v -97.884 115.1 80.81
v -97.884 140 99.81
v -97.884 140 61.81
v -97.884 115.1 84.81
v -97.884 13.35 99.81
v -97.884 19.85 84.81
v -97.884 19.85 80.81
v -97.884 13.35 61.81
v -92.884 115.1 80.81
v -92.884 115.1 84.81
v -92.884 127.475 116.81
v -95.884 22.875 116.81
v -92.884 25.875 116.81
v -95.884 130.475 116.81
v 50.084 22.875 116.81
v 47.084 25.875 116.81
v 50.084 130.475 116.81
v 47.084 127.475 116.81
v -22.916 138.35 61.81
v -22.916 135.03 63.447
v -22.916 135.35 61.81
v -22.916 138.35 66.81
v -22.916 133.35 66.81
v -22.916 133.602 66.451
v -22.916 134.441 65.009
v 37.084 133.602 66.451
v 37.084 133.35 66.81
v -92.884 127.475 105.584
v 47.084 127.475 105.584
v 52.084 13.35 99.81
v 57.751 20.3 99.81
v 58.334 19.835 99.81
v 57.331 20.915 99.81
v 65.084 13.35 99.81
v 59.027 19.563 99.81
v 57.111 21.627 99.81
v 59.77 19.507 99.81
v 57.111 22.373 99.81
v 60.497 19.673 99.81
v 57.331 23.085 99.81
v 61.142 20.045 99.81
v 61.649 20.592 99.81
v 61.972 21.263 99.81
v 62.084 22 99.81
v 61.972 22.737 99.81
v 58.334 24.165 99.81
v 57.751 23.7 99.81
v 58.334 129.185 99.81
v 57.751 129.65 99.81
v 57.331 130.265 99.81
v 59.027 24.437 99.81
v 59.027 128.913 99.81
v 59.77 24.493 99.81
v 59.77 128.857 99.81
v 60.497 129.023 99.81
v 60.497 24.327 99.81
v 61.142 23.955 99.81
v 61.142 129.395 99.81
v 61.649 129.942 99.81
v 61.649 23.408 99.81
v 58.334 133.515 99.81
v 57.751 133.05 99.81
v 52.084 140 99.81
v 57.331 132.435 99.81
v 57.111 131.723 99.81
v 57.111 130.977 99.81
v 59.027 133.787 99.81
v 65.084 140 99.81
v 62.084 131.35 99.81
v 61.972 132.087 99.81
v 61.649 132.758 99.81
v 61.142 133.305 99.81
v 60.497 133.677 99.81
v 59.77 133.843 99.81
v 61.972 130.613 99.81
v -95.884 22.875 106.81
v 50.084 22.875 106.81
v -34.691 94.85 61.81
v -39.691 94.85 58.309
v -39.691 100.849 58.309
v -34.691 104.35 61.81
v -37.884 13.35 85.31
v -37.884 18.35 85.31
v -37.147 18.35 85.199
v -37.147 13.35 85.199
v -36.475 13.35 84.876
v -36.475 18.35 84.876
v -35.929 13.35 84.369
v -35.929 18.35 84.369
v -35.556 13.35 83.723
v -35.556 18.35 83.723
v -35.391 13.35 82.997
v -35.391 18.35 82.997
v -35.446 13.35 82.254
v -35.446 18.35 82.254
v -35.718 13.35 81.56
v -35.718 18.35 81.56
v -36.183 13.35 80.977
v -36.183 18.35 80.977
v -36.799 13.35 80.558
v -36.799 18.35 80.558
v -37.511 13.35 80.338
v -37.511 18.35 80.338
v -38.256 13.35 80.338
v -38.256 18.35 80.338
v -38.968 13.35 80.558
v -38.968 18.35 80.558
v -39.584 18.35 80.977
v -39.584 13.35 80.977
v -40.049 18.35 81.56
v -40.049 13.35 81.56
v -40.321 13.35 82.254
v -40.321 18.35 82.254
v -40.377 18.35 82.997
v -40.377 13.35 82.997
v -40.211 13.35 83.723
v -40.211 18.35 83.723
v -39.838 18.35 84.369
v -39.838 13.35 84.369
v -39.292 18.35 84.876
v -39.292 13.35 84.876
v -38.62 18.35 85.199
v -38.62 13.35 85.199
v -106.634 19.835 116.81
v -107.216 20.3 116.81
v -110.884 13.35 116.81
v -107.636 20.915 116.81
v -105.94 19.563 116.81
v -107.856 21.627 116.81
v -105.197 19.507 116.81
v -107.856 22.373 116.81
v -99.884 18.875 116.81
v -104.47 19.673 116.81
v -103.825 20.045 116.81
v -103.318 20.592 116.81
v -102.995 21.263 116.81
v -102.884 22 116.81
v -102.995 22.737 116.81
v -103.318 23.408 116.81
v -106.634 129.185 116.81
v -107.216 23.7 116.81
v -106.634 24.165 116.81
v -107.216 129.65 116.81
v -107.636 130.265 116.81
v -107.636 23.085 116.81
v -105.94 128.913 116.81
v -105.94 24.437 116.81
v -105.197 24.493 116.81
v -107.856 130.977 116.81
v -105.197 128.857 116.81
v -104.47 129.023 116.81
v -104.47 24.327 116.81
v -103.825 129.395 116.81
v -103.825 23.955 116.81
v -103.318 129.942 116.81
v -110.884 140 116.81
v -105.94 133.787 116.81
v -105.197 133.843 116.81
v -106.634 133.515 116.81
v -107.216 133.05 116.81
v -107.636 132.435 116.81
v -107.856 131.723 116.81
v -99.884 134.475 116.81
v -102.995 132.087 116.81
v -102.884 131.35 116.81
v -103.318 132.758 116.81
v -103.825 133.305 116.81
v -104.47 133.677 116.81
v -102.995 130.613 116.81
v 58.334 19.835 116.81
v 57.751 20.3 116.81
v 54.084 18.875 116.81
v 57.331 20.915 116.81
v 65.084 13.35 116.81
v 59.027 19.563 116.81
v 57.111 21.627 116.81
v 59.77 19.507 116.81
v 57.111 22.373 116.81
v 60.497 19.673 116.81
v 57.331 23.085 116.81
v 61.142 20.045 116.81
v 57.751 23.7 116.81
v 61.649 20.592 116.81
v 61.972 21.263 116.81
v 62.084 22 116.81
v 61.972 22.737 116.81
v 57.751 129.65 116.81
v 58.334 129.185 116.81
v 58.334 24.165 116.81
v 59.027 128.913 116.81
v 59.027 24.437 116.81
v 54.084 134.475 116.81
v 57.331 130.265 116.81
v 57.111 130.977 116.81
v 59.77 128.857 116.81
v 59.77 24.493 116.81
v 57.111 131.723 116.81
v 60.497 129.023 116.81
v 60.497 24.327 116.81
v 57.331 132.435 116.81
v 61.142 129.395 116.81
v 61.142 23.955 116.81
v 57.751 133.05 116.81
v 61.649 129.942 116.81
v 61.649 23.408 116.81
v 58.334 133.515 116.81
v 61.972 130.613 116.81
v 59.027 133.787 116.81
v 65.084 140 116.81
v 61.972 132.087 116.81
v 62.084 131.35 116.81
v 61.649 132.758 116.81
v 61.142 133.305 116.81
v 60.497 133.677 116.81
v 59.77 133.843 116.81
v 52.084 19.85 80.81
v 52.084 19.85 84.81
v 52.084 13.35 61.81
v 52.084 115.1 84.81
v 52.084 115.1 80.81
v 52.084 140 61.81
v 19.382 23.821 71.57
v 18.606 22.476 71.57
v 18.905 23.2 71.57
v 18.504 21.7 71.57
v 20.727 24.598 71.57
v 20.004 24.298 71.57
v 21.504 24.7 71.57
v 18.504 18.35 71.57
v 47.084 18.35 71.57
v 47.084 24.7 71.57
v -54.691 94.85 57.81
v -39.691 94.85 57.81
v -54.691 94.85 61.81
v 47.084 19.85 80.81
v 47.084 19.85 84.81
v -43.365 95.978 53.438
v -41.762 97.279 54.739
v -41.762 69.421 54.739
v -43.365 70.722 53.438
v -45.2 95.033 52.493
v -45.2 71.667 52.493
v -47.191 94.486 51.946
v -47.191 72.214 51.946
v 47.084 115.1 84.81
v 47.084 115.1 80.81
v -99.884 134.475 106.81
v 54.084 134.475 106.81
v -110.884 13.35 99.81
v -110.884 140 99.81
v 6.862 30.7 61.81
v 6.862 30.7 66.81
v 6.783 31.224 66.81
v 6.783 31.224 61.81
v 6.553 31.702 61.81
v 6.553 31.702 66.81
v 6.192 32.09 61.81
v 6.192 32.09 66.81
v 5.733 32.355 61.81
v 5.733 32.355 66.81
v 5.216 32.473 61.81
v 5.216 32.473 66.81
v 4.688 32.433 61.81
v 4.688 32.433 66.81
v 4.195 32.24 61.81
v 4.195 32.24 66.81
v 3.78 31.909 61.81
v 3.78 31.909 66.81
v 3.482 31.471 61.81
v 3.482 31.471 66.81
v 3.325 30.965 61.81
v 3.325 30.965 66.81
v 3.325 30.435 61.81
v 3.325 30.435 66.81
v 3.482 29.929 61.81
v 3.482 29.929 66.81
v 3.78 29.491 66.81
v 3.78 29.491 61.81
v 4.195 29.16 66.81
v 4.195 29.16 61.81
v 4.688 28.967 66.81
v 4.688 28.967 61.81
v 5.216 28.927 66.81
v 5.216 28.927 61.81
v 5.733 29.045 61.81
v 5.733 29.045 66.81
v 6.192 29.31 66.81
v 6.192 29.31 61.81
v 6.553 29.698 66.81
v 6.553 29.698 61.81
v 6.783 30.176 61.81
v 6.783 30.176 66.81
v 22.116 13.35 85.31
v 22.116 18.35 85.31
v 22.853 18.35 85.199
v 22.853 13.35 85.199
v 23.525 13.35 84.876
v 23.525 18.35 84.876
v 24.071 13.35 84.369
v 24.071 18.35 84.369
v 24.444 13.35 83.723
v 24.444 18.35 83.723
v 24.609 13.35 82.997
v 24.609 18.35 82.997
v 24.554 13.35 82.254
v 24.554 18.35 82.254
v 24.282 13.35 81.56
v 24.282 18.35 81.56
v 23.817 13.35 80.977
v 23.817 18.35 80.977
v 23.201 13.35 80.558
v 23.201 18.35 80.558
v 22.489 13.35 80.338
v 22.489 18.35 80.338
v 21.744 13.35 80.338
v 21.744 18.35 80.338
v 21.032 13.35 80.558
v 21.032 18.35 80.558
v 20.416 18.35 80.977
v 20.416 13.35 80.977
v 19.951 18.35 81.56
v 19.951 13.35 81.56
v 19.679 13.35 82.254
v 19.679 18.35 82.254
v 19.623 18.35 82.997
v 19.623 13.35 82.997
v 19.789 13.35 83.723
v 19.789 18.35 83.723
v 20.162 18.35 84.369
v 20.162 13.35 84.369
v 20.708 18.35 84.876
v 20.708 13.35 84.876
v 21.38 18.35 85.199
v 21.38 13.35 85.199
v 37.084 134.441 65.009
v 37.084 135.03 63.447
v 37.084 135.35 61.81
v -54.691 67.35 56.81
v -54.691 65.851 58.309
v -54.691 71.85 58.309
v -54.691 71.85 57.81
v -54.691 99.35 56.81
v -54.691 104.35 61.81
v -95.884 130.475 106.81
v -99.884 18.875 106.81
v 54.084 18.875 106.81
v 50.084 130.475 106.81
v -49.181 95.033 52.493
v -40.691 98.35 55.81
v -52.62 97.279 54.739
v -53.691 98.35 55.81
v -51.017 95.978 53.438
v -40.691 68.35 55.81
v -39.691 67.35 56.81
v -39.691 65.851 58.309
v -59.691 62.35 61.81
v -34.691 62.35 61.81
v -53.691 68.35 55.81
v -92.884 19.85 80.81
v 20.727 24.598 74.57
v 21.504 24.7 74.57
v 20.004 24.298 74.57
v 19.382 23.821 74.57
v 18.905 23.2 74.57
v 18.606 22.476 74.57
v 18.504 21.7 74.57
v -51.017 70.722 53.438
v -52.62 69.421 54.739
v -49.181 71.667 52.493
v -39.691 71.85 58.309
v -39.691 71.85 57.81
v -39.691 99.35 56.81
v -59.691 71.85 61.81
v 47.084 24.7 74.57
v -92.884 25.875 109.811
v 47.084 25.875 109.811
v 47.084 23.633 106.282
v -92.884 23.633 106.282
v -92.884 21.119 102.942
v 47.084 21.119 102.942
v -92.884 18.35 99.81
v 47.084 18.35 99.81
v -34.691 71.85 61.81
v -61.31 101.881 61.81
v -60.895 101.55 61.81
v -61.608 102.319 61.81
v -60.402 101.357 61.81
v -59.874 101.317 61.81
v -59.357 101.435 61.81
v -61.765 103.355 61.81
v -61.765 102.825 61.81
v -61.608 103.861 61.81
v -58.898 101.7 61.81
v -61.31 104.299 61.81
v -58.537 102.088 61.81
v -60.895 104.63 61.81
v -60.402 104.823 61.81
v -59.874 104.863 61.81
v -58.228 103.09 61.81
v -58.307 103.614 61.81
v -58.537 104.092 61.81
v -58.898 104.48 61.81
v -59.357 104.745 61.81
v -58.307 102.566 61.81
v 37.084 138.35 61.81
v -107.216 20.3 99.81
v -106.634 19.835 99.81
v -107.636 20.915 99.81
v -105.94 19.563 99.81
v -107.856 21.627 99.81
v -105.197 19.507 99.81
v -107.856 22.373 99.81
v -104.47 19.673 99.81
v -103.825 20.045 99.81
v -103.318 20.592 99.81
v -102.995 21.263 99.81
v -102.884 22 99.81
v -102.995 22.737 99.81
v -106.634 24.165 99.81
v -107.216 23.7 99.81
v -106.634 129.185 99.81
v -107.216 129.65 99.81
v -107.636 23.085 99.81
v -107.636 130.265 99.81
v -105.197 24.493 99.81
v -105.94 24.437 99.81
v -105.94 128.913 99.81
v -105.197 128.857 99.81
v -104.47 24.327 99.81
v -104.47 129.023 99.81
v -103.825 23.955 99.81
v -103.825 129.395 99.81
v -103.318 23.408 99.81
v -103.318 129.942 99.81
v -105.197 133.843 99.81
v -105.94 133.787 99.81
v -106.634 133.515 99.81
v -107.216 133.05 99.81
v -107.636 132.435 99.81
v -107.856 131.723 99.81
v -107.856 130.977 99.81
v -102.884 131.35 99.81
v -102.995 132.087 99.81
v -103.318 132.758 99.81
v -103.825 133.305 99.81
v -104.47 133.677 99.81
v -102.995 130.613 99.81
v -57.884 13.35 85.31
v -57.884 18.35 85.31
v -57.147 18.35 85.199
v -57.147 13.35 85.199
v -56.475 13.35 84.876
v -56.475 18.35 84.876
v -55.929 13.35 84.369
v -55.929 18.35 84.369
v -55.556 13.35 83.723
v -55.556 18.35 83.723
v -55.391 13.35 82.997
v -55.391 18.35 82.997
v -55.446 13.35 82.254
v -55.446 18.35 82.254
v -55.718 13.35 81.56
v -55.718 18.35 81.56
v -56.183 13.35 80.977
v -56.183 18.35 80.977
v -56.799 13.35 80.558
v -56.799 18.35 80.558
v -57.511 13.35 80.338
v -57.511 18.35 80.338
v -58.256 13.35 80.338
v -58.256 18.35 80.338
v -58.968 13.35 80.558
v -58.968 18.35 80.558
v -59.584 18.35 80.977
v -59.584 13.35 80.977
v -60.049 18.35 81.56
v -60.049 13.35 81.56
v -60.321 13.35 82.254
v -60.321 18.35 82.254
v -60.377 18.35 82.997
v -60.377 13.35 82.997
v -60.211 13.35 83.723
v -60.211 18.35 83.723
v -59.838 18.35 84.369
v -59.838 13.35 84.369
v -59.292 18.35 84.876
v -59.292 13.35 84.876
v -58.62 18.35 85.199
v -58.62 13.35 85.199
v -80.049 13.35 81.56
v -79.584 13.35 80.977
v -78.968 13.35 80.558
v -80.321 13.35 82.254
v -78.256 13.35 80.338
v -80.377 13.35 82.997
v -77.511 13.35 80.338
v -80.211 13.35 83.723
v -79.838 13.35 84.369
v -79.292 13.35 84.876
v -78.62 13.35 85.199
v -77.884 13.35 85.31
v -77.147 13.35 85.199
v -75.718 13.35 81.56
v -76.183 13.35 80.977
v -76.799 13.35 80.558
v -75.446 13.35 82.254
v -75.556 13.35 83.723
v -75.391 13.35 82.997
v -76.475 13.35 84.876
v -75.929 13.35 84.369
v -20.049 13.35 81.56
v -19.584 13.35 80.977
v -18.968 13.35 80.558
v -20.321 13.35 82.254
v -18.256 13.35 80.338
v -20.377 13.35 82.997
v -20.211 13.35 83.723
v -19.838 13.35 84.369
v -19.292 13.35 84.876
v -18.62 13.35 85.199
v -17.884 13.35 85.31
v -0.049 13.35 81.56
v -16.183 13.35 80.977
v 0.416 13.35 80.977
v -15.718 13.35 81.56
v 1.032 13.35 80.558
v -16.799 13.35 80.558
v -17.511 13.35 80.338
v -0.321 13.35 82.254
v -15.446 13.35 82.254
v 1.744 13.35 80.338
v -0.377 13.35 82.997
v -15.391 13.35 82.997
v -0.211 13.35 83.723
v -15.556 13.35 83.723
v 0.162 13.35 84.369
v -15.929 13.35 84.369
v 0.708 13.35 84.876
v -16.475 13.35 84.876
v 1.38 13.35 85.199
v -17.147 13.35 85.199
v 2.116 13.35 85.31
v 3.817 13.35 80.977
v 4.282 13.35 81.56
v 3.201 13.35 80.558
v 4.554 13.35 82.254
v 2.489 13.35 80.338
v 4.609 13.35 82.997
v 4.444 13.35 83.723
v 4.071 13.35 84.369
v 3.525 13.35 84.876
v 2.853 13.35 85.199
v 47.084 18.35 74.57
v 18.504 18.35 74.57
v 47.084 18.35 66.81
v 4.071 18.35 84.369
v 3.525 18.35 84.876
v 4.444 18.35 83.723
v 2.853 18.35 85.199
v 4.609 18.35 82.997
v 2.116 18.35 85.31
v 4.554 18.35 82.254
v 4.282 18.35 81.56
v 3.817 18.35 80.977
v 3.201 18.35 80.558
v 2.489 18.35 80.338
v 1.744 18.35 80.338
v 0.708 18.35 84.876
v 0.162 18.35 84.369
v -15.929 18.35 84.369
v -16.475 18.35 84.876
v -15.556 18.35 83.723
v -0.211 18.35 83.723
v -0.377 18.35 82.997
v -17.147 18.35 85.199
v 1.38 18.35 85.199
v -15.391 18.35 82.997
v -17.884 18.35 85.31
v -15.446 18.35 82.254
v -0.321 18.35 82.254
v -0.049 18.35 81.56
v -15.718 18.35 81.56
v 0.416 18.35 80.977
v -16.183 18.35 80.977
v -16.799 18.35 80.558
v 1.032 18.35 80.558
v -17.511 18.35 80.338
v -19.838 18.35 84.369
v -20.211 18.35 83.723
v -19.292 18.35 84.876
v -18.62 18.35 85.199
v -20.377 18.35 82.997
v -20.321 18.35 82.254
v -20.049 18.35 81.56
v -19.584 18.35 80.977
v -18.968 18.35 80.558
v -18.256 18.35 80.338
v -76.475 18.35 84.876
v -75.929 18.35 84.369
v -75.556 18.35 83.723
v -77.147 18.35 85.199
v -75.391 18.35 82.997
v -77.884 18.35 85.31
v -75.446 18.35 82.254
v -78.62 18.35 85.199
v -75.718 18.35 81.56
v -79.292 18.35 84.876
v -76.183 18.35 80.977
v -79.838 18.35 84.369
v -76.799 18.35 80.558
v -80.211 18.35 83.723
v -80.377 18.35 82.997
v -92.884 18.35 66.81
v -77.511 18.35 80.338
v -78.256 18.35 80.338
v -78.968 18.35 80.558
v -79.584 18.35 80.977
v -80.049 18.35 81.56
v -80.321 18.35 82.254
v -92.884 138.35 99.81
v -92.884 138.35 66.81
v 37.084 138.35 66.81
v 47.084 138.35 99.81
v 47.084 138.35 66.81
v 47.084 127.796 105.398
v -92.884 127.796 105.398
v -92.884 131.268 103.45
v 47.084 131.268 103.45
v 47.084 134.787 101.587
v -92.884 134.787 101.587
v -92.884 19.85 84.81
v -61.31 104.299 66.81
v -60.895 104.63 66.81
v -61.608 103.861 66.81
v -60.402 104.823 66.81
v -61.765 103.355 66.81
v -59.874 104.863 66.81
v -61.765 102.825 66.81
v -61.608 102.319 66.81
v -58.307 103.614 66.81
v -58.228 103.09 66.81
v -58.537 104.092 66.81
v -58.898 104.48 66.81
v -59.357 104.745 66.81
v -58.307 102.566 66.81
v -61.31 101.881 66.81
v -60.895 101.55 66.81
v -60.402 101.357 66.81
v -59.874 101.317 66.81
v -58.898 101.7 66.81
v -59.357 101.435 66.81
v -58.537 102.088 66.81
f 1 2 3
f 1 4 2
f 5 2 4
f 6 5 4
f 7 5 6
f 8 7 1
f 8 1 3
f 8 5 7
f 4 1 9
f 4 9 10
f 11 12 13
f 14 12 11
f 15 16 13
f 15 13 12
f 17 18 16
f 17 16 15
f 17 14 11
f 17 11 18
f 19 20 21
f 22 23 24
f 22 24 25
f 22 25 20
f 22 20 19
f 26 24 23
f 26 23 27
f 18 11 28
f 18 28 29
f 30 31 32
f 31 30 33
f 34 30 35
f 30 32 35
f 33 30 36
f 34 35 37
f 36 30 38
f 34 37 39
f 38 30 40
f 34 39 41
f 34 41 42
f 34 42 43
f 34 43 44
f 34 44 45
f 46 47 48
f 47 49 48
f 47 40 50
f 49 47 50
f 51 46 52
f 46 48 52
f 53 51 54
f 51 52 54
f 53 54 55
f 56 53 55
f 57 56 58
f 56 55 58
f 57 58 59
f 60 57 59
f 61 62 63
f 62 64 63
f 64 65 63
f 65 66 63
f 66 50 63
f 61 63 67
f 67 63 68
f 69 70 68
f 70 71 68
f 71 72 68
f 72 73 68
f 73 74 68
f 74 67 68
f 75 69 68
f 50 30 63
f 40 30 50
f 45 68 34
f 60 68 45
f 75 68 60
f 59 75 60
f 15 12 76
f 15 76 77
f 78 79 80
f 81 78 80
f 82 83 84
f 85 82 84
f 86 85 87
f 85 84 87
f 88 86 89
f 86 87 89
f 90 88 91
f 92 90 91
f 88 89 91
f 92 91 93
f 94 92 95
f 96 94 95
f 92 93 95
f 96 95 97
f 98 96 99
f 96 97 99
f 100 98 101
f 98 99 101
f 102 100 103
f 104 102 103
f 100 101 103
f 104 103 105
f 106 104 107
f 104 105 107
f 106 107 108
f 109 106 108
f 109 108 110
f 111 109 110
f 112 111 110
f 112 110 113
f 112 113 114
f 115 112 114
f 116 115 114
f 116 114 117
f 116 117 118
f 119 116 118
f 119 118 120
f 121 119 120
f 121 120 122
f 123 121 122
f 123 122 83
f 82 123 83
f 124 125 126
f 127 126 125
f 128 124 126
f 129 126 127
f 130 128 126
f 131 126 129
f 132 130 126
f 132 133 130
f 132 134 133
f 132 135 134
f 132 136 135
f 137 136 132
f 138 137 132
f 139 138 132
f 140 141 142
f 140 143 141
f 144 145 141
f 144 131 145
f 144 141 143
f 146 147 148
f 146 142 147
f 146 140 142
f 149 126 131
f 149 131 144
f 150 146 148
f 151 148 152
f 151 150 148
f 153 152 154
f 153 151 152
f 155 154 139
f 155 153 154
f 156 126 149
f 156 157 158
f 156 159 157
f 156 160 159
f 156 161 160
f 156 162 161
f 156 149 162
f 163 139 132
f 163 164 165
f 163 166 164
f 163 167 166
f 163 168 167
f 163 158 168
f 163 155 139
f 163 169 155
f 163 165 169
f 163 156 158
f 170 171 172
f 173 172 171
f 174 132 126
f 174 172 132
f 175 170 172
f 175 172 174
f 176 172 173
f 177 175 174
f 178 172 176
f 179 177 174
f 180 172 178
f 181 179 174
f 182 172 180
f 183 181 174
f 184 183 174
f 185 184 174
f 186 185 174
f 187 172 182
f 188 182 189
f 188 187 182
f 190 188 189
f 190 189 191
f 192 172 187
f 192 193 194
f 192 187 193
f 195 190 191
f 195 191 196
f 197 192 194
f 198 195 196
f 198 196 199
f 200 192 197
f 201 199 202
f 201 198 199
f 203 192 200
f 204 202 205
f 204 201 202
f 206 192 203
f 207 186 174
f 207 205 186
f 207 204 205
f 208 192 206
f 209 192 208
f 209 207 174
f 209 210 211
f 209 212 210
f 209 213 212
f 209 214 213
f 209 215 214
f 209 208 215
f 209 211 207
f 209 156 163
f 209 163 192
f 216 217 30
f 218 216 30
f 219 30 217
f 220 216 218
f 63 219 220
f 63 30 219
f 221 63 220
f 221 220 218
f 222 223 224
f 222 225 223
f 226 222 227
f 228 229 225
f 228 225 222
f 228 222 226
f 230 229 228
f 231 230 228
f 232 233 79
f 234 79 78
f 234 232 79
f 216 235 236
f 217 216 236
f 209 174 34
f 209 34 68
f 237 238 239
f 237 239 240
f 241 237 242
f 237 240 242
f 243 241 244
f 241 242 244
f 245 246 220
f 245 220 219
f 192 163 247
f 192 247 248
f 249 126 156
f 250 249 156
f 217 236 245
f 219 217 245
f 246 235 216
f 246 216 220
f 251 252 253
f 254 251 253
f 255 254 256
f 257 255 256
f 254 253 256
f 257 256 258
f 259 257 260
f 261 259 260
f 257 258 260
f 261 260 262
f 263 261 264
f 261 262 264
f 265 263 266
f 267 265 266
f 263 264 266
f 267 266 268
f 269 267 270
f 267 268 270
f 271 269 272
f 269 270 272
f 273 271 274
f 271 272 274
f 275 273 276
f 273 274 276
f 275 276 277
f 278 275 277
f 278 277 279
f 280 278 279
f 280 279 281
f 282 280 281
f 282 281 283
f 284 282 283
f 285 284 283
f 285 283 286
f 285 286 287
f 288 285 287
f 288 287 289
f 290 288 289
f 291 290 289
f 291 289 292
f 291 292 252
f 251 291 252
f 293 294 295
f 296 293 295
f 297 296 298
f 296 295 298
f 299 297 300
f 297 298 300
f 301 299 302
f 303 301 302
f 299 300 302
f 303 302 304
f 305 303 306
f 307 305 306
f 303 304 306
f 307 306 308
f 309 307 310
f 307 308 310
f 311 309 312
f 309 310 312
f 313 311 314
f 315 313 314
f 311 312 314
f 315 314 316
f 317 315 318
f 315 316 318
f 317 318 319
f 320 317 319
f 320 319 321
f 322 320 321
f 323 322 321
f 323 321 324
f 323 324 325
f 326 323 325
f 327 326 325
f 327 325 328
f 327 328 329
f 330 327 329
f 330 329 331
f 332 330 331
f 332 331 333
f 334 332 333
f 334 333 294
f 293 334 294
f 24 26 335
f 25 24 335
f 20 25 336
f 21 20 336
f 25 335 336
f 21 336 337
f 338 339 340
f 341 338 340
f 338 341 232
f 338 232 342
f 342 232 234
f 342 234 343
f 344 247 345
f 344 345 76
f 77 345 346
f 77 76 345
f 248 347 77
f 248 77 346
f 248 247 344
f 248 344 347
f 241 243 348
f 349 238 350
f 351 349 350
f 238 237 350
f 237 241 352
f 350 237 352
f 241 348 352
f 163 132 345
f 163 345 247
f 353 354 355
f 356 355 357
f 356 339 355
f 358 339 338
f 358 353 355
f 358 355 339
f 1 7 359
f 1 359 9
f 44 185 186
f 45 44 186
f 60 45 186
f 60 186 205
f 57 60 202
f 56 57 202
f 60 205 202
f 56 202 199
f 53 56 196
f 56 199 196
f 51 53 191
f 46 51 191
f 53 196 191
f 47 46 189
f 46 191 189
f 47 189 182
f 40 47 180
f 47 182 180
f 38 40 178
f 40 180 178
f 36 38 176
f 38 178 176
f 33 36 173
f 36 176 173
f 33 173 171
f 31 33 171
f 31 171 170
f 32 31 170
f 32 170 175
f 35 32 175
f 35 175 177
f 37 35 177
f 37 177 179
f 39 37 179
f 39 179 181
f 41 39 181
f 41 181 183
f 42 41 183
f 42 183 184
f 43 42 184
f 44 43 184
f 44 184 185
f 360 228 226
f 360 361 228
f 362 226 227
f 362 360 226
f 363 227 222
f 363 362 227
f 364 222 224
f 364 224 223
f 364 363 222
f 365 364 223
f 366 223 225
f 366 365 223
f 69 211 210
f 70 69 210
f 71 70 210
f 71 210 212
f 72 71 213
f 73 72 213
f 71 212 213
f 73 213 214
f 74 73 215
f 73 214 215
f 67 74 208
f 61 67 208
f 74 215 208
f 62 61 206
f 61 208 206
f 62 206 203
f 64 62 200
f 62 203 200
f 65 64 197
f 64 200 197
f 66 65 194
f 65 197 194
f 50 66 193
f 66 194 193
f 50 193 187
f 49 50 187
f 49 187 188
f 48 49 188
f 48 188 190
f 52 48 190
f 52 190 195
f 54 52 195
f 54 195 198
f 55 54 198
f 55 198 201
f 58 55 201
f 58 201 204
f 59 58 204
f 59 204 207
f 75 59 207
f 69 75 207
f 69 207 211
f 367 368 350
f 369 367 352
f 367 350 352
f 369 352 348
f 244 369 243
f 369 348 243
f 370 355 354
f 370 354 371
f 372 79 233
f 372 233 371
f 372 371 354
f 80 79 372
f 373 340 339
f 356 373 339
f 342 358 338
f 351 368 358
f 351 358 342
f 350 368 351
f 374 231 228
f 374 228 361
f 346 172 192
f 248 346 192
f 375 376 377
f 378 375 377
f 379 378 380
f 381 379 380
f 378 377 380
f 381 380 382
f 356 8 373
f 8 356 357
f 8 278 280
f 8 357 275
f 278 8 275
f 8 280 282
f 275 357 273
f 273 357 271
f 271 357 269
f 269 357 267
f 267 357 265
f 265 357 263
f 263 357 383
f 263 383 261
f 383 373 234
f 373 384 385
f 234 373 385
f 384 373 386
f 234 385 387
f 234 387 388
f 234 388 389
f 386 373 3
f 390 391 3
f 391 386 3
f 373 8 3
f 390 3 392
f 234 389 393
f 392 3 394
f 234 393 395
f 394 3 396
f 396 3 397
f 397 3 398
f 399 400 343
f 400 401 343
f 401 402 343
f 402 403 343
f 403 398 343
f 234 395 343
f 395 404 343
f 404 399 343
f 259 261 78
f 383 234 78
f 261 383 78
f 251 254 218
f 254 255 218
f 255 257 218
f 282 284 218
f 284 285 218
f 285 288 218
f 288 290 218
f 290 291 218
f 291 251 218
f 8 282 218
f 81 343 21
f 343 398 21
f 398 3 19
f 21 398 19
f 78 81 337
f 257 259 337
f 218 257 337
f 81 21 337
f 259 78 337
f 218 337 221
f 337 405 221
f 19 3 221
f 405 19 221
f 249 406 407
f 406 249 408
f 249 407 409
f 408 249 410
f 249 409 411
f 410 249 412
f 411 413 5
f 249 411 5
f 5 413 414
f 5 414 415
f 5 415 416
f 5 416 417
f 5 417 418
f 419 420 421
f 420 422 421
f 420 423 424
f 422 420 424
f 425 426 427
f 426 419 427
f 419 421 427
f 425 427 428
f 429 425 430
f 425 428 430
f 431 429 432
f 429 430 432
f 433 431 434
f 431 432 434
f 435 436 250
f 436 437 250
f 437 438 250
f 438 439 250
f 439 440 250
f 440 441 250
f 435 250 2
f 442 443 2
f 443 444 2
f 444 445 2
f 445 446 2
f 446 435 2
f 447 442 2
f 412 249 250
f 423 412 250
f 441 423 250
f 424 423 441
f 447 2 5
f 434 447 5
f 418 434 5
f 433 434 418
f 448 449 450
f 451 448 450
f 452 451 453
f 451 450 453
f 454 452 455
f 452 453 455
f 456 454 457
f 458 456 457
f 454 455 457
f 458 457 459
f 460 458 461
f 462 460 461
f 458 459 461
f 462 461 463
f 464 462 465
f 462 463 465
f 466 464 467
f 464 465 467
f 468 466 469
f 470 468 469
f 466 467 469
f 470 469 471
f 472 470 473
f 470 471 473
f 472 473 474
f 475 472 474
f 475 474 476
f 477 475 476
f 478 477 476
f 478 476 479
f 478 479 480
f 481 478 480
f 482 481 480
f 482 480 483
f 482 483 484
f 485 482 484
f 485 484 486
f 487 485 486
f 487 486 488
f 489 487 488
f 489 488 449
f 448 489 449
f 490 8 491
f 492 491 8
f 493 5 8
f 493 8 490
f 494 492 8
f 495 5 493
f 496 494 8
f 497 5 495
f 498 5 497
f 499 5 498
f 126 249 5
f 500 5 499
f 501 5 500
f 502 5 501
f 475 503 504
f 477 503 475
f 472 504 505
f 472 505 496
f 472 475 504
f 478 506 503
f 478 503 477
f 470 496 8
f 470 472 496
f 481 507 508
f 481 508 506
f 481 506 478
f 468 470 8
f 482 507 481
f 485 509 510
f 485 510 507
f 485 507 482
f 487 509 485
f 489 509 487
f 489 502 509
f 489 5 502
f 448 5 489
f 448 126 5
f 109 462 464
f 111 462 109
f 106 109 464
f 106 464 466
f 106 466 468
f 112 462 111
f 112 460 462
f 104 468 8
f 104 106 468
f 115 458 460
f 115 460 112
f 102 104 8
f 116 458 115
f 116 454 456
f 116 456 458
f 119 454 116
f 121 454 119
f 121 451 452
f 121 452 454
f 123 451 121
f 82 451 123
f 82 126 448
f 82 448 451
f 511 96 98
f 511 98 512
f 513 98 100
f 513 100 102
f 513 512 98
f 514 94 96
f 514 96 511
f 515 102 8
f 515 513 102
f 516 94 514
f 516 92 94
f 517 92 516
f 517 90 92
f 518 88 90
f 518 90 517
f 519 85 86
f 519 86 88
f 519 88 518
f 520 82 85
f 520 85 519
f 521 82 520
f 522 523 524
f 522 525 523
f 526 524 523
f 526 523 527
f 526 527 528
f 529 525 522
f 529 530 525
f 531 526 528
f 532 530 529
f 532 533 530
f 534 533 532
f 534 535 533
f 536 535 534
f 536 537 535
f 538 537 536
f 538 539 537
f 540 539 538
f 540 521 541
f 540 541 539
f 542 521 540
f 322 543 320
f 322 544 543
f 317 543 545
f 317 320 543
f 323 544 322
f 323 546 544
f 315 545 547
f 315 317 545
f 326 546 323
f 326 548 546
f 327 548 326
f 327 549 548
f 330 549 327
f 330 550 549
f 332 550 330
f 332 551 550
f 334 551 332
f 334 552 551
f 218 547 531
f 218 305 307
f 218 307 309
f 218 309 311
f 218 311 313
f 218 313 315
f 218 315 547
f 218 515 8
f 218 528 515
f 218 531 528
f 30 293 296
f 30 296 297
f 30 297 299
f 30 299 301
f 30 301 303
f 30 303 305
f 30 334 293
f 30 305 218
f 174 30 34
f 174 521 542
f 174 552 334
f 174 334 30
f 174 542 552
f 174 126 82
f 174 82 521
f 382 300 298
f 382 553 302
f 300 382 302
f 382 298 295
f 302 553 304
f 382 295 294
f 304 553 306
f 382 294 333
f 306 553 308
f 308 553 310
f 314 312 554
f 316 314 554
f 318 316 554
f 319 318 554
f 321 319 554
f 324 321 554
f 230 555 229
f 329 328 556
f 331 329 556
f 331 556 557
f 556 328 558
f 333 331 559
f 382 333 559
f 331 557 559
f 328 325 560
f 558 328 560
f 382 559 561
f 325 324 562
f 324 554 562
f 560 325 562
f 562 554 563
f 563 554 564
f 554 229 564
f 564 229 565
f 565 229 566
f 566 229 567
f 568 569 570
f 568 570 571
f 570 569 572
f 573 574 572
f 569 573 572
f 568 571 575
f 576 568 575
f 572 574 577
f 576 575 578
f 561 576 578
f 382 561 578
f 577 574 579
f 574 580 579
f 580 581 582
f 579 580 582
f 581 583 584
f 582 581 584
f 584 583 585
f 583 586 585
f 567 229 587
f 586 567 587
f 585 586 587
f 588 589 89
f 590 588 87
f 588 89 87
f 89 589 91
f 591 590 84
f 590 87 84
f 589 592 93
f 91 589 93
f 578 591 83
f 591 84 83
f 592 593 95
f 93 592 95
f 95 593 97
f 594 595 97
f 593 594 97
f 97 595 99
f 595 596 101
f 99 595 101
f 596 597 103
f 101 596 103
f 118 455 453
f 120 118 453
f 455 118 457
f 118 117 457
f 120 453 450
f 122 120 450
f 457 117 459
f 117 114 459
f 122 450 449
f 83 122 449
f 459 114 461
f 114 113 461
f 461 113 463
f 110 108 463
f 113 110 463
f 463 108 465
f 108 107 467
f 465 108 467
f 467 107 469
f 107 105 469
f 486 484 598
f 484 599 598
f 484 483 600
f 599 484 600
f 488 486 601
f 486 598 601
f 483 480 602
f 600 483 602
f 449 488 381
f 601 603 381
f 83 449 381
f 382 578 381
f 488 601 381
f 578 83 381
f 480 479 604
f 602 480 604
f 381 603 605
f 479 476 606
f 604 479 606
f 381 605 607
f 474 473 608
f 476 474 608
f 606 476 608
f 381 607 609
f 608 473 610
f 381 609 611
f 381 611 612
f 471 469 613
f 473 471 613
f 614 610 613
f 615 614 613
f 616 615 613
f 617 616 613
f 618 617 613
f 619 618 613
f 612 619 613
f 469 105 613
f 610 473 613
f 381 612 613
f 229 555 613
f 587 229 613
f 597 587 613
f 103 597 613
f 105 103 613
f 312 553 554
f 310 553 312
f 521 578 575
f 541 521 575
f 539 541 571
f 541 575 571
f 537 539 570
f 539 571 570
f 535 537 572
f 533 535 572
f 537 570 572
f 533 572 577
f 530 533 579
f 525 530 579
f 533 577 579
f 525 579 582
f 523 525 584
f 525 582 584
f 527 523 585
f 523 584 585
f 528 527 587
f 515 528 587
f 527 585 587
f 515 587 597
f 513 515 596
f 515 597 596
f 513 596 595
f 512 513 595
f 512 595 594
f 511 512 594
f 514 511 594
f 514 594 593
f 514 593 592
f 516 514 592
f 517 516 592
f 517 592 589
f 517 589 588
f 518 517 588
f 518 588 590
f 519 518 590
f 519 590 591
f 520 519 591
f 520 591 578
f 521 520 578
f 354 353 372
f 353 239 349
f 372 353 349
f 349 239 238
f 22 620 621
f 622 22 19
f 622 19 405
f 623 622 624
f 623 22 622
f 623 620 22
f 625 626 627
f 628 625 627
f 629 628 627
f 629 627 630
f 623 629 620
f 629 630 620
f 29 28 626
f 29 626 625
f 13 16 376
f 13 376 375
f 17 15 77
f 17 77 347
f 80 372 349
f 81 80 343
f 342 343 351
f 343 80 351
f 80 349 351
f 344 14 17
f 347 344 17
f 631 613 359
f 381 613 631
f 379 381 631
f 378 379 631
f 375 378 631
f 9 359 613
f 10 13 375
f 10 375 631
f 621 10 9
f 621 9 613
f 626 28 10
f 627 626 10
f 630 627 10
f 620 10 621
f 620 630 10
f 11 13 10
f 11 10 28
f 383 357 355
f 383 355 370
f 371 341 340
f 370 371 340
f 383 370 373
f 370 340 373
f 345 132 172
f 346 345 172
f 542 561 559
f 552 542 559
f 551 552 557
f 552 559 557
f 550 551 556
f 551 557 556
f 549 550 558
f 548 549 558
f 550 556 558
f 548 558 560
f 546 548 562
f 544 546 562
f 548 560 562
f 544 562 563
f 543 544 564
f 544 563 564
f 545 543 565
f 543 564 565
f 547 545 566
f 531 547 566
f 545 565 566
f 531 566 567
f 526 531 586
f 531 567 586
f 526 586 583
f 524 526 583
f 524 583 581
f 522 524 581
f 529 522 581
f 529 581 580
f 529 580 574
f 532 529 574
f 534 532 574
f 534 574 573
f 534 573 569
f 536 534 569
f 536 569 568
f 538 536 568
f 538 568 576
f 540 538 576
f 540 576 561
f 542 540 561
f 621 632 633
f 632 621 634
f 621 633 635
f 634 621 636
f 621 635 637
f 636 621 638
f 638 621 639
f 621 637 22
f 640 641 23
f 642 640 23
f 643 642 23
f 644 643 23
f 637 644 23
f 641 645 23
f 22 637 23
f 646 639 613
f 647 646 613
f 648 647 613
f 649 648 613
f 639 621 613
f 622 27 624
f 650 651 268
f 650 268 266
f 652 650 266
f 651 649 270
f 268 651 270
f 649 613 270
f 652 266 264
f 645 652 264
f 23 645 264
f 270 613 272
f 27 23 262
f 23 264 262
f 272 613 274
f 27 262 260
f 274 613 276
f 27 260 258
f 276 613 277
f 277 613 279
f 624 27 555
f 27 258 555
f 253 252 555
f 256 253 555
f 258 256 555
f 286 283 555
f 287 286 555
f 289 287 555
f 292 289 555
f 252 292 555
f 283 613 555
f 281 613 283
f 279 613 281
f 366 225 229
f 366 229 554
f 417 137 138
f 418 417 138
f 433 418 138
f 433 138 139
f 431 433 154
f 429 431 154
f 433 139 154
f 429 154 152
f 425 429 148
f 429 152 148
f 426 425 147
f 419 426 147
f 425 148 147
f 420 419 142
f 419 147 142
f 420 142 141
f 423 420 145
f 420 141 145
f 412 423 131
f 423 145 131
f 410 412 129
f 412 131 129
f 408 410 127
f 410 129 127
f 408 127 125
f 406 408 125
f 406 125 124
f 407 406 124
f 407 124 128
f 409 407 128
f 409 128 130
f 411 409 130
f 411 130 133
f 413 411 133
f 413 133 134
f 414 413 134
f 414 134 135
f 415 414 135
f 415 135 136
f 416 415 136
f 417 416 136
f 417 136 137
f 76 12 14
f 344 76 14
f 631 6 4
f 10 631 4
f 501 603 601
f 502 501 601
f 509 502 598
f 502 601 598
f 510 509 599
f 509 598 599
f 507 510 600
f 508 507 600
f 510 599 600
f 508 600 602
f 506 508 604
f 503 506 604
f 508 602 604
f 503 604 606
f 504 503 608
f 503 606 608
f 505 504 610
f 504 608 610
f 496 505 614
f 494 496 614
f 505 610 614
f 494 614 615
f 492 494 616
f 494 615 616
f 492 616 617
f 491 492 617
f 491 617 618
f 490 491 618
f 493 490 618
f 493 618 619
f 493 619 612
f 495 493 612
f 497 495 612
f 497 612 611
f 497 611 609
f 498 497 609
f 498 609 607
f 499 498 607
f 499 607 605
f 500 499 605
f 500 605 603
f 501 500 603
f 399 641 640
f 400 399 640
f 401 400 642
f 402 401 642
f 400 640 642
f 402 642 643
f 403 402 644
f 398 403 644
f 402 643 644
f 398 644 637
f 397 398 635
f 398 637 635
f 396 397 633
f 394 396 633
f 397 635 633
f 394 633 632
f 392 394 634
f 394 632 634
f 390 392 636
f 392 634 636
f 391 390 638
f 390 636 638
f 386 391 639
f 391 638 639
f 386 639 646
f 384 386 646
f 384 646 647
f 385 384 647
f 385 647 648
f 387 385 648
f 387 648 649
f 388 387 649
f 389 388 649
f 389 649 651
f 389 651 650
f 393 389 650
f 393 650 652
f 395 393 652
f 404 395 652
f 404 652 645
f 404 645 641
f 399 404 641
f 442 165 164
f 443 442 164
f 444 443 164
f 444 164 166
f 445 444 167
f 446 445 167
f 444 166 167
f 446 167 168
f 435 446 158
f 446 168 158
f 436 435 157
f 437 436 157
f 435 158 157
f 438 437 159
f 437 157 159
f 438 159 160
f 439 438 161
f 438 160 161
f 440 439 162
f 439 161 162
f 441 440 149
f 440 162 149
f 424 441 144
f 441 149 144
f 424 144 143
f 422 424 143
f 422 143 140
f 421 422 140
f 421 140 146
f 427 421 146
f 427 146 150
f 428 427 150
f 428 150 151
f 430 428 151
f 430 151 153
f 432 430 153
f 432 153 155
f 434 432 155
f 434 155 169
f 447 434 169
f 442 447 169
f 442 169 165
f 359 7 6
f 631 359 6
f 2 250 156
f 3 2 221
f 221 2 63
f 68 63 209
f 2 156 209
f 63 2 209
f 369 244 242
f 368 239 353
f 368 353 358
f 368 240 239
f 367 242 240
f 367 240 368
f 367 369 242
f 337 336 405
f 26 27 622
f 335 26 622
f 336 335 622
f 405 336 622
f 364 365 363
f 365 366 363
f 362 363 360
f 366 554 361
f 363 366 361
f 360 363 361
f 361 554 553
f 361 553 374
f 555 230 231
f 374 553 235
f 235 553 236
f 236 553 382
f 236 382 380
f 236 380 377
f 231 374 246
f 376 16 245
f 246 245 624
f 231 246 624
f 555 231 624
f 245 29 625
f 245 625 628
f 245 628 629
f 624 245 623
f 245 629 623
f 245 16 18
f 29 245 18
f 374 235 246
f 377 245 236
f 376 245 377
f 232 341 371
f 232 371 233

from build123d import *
from OCP.BRepFilletAPI import BRepFilletAPI_MakeChamfer

# Parameters (mm, degrees)
SKETCH1_R               = 172.5
BOSS_EXTRUDE1_DEPTH     = 10
SKETCH2_R               = 48.41
CUT_EXTRUDE1_DEPTH      = 10
BOSS_EXTRUDE2_DEPTH     = 5
CUT_EXTRUDE2_DEPTH      = 497
CUT_EXTRUDE6_START      = -497
CUT_EXTRUDE6_DEPTH      = 497
SKETCH6_W               = 195.767044214
SKETCH6_H               = 55
SKETCH6_W_2             = 185.767044214
SKETCH6_H_2             = 45
BOSS_EXTRUDE3_DEPTH     = 133.35
SKETCH7_W               = 185.767044214
SKETCH7_H               = 45
BOSS_EXTRUDE4_DEPTH     = 5
BOSS_EXTRUDE5_DEPTH     = 8
CHAMFER1_SIZE           = 8
CHAMFER1_SIZE2          = 6.250285012
CHAMFER1_PART_2_SIZE    = 8
CHAMFER1_PART_2_SIZE2   = 6.250285012
CHAMFER1_PART_3_SIZE    = 8
CHAMFER1_PART_3_SIZE2   = 6.250285012
FILLET1_R               = 38
SKETCH9_R               = 374.079334695
CUT_EXTRUDE7_DEPTH      = 93
CUT_EXTRUDE8_DEPTH      = 93
CUT_EXTRUDE8_DEPTH_BACK = 93
SKETCH10_R              = 229.38613092
SKETCH10_R_2            = 152.4
SKETCH11_W              = 291.443368419
SKETCH11_H              = 134.798764099
SKETCH11_W_2            = 144.967044214
SKETCH11_H_2            = 55
CUT_EXTRUDE9_DEPTH      = 143
SKETCH12_W              = 5
SKETCH12_H              = 55
BOSS_EXTRUDE6_DEPTH     = 133.35
SKETCH14_W              = 139.967044214
SKETCH14_H              = 45
BOSS_EXTRUDE7_DEPTH     = 5
SKETCH15_W              = 139.967044214
SKETCH15_H              = 123.35
CUT_EXTRUDE11_DEPTH     = 13
SKETCH16_W              = 10
SKETCH16_H              = 133.35
SKETCH16_W_2            = 149.967044214
BOSS_EXTRUDE9_DEPTH     = 17
SKETCH17_W              = 153.967044214
SKETCH17_H              = 115.6
SKETCH17_W_2            = 145.967044214
SKETCH17_H_2            = 107.6
CUT_EXTRUDE12_DEPTH     = 10
CHAMFER2_SIZE           = 10
CHAMFER2_SIZE2          = 5.773502692
SKETCH20_W              = 169.967044214
SKETCH20_H              = 3.35
CUT_EXTRUDE17_DEPTH     = 177.5
SKETCH25_W              = 139.967044214
SKETCH25_H              = 38.773502692
BOSS_EXTRUDE11_DEPTH    = 5
SKETCH26_W              = 3
SKETCH26_H              = 130
BOSS_EXTRUDE12_DEPTH    = 17
SKETCH18_R              = 2.5
CUT_EXTRUDE19_DEPTH     = 26
SKETCH27_W              = 60
SKETCH27_H              = 3
CUT_EXTRUDE20_DEPTH     = 23
SKETCH28_R              = 2.5
CUT_EXTRUDE21_DEPTH     = 10
SKETCH29_W              = 15
SKETCH29_H              = 30
BOSS_EXTRUDE13_DEPTH    = 10
SKETCH30_W              = 4
SKETCH30_H              = 23
CUT_EXTRUDE22_DEPTH     = 21
CHAMFER3_SIZE           = 6
SKETCH31_W              = 175.967044214
SKETCH31_H              = 24.006818343
CUT_EXTRUDE23_DEPTH     = 71
SKETCH33_W              = 4
SKETCH33_H              = 95.25
CUT_EXTRUDE25_DEPTH     = 182
CHAMFER5_SIZE           = 5
CHAMFER6_SIZE           = 4
FILLET2_R               = 10
SKETCH32_R              = 1.778
CUT_EXTRUDE26_DEPTH     = 10
CHAMFER7_SIZE           = 5
CHAMFER7_SIZE2          = 3.501037691
SKETCH34_W              = 3
SKETCH34_H              = 6.35
BOSS_EXTRUDE14_DEPTH    = 28.58
FILLET3_R               = 3
FILLET4_R               = 53
FILLET5_R               = 163
CHAMFER8_SIZE           = 2
CHAMFER8_SIZE2          = 2.856296013
FILLET7_R               = 10


# Some blends are built 0.0001 mm under size
with BuildPart() as part:
    # Sketch1 → Boss-Extrude1 (new body)
    with BuildSketch(Plane(origin=(0, 0, 0), x_dir=(1, 0, 0), z_dir=(0, 1, 0))):
        with Locations(Location((0, 0, 0), (0, 0, 270))):
            Circle(SKETCH1_R)
    extrude(amount=BOSS_EXTRUDE1_DEPTH)

    # Sketch2 → Cut-Extrude1 (cut)
    with BuildSketch(Plane(origin=(0, 10, 0), x_dir=(1, 0, 0), z_dir=(0, 1, 0))):
        with Locations((-75.91, -178.72)):
            Circle(SKETCH2_R)
        with Locations((75.91, -178.72)):
            Circle(SKETCH2_R)
    extrude(amount=-CUT_EXTRUDE1_DEPTH, mode=Mode.SUBTRACT)

    # Sketch3 → Boss-Extrude2 (add)
    with BuildSketch(Plane(origin=(0, 10, 0), x_dir=(1, 0, 0), z_dir=(0, 1, 0))):
        with BuildLine():
            Line((-98.968297449, -119.81), (98.968297449, -119.81))
            ThreePointArc((98.968297449, -119.81), (0, 155.4), (-98.968297449, -119.81))
        make_face()
        with BuildLine():
            ThreePointArc((97.883522107, -116.81), (0, 152.4), (-97.883522107, -116.81))
            Line((-97.883522107, -116.81), (97.883522107, -116.81))
        make_face(mode=Mode.SUBTRACT)
    extrude(amount=BOSS_EXTRUDE2_DEPTH)

    # Sketch4 → Cut-Extrude2 (cut)
    with BuildSketch(Plane(origin=(0, 10, 0), x_dir=(1, 0, 0), z_dir=(0, 1, 0))):
        Polygon((-28.261160255, -170.169200565), (28.261160255, -170.169200565), (28.261160255, -183.836149753), (-30.300470404, -183.836149753), align=None)
    extrude(amount=-CUT_EXTRUDE2_DEPTH, mode=Mode.SUBTRACT)

    # Sketch5 → Cut-Extrude6 (cut)
    with BuildSketch(Plane(origin=(0, 10, 0), x_dir=(1, 0, 0), z_dir=(0, 1, 0)).offset(CUT_EXTRUDE6_START)):
        with BuildLine():
            ThreePointArc((26.702080818, 170.420799435), (0, 172.5), (-26.702080818, 170.420799435))
            Line((-26.702080818, 170.420799435), (26.702080818, 170.420799435))
        make_face()
        with BuildLine():
            ThreePointArc((166.525, -45.007492432), (172.5, 0), (166.525, 45.007492432))
            Line((166.525, 45.007492432), (166.525, -45.007492432))
        make_face()
        with BuildLine():
            Line((-166.525, -45.007492432), (-166.525, 45.007492432))
            ThreePointArc((-166.525, 45.007492432), (-172.5, 0), (-166.525, -45.007492432))
        make_face()
    extrude(amount=CUT_EXTRUDE6_DEPTH, mode=Mode.SUBTRACT)

    # Sketch6 → Boss-Extrude3 (add)
    with BuildSketch(Plane(origin=(0, 10, 0), x_dir=(1, 0, 0), z_dir=(0, 1, 0))):
        with Locations((0, -89.31)):
            Rectangle(SKETCH6_W, SKETCH6_H)
        with Locations((0, -89.31)):
            Rectangle(SKETCH6_W_2, SKETCH6_H_2, mode=Mode.SUBTRACT)
    extrude(amount=BOSS_EXTRUDE3_DEPTH)

    # Sketch7 → Boss-Extrude4 (add)
    with BuildSketch(Plane(origin=(0, 10, 0), x_dir=(1, 0, 0), z_dir=(0, 1, 0))):
        with Locations((0, -89.31)):
            Rectangle(SKETCH7_W, SKETCH7_H)
    extrude(amount=BOSS_EXTRUDE4_DEPTH)

    # Sketch8 → Boss-Extrude5 (add)
    with BuildSketch(Plane(origin=(0, 10, 0), x_dir=(1, 0, 0), z_dir=(0, 1, 0))):
        with BuildLine():
            Line((-97.883522107, -61.81), (-112.883522107, -61.81))
            Line((-112.883522107, -61.81), (-112.883522107, -101.267136509))
            ThreePointArc((-112.883522107, -101.267136509), (-105.634768892, -108.807252061), (-97.883522107, -115.829782871))
            Line((-97.883522107, -115.829782871), (-97.883522107, -61.81))
        make_face()
        with BuildLine():
            Line((-88.028513968, -46.81), (-88.028513968, -61.81))
            Line((-88.028513968, -61.81), (97.883522107, -61.81))
            Line((97.883522107, -61.81), (97.883522107, -115.829782871))
            ThreePointArc((97.883522107, -115.829782871), (105.634768892, -108.807252061), (112.883522107, -101.267136509))
            Line((112.883522107, -101.267136509), (112.883522107, -46.81))
            Line((112.883522107, -46.81), (-88.028513968, -46.81))
        make_face()
    extrude(amount=BOSS_EXTRUDE5_DEPTH)

    # Chamfer1
    chamfer1_edges = [part.edges().sort_by_distance(p)[0] for p in [
        (-97.883522107, 18, 88.819891436),
    ]]
    chamfer1_side = [part.faces().sort_by_distance(p)[0] for p in [
        (-97.883522107, 80.599247918, 89.340686997),
    ]]
    chamfer(chamfer1_edges, length=CHAMFER1_SIZE, length2=CHAMFER1_SIZE2, reference=chamfer1_side[0])

    # Chamfer1 part 2
    chamfer1_part_2_edges = [part.edges().sort_by_distance(p)[0] for p in [
        (4.927504069, 18, 61.81),
    ]]
    chamfer1_part_2_side = [part.faces().sort_by_distance(p)[0] for p in [
        (-0.807441513, 80.139082253, 61.81),
    ]]
    chamfer(chamfer1_part_2_edges, length=CHAMFER1_PART_2_SIZE, length2=CHAMFER1_PART_2_SIZE2, reference=chamfer1_part_2_side[0])

    # Chamfer1 part 3
    chamfer1_part_3_edges = [part.edges().sort_by_distance(p)[0] for p in [
        (97.883522107, 18, 88.819891436),
    ]]
    chamfer1_part_3_side = [part.faces().sort_by_distance(p)[0] for p in [
        (97.883522107, 80.599247918, 89.340686997),
    ]]
    chamfer(chamfer1_part_3_edges, length=CHAMFER1_PART_3_SIZE, length2=CHAMFER1_PART_3_SIZE2, reference=chamfer1_part_3_side[0])

    # Fillet1
    # the kernel refuses this fillet: 38 mm, written as the material it adds along each edge
    with BuildSketch(Plane(origin=(-97.883522107, 26, 148.028657271), x_dir=(-0.61566147532566, -0.7880107536067207, 0), z_dir=(0, 0, -1))) as fillet1_piece_1_section:
        with BuildLine():
            CenterArc((13.24591235, 37.873851244), FILLET1_R, 232, 33.330100487)
            Line((-10.149223713, 7.929442607), (0, 0))
            Line((0, 0), (10.152145721, 0))
        make_face()
    fillet1_piece_1 = extrude(amount=86.218657271, mode=Mode.PRIVATE)
    fillet1_piece_1 = fillet1_piece_1 & Plane(origin=(0, 26, 0), x_dir=(-0.7443687577094257, 0, 0.6677687867414337), z_dir=(0, -1, 0)) * Cylinder(151.65, 214, mode=Mode.PRIVATE)
    add(fillet1_piece_1)
    with BuildSketch(Plane(origin=(-88.028513968, 26, 61.81), x_dir=(0, 1, 0), z_dir=(1, 0, 0))) as fillet1_piece_2_section:
        with BuildLine():
            CenterArc((12.87954976, -38), FILLET1_R, 90, 33.330100487)
            Line((-8, -6.250285012), (0, 0))
            Line((0, 0), (12.87954976, 0))
        make_face()
    fillet1_piece_2 = extrude(amount=218.110910475, mode=Mode.PRIVATE)
    fillet1_piece_2 = fillet1_piece_2 - Plane(origin=(135.883522107, 38.87954976, 61.81), x_dir=(-0.8355188154722692, -0.5494618357919104, 0), z_dir=(0, 0, -1)) * Cylinder(38, 488, mode=Mode.PRIVATE)
    add(fillet1_piece_2)
    with BuildSketch(Plane(origin=(97.883522107, 26, 29.6111256), x_dir=(0.61566147532566, -0.7880107536067207, 0), z_dir=(0, 0, 1))) as fillet1_piece_3_section:
        with BuildLine():
            CenterArc((13.24591235, 37.873851244), FILLET1_R, 232, 33.330100487)
            Line((-10.149223713, 7.929442607), (0, 0))
            Line((0, 0), (10.152145721, 0))
        make_face()
    fillet1_piece_3 = extrude(amount=118.417531672, mode=Mode.PRIVATE)
    fillet1_piece_3 = fillet1_piece_3 & Plane(origin=(0, 26, 0), x_dir=(0.6454567893612635, 0, 0.7637967878090673), z_dir=(0, -1, 0)) * Cylinder(151.65, 278, mode=Mode.PRIVATE)
    fillet1_piece_3 = fillet1_piece_3 - Plane(origin=(97.883522107, 38.87954976, 23.81), x_dir=(0, 0, 1), z_dir=(-1, 0, 0)) * Cylinder(38, 278, mode=Mode.PRIVATE)
    add(fillet1_piece_3)

    # Sketch9 → Cut-Extrude7 (cut)
    with BuildSketch(Plane(origin=(0, 10, 0), x_dir=(1, 0, 0), z_dir=(0, 1, 0))):
        Circle(SKETCH9_R)
    extrude(amount=-CUT_EXTRUDE7_DEPTH, mode=Mode.SUBTRACT)

    # Sketch10 → Cut-Extrude8 (cut, two sides: drawn at the far end of the back side and taken through both)
    with BuildSketch(Plane.XZ.offset(-10).offset(-CUT_EXTRUDE8_DEPTH_BACK)):
        Circle(SKETCH10_R)
        Circle(SKETCH10_R_2, mode=Mode.SUBTRACT)
    extrude(amount=CUT_EXTRUDE8_DEPTH + CUT_EXTRUDE8_DEPTH_BACK, mode=Mode.SUBTRACT)

    # Sketch11 → Cut-Extrude9 (cut)
    with BuildSketch(Plane(origin=(0, 143.35, 0), x_dir=(1, 0, 0), z_dir=(0, 1, 0))):
        with Locations((4.840839595, -88.771460056)):
            Rectangle(SKETCH11_W, SKETCH11_H)
        with Locations((-25.4, -89.31)):
            Rectangle(SKETCH11_W_2, SKETCH11_H_2, mode=Mode.SUBTRACT)
    extrude(amount=-CUT_EXTRUDE9_DEPTH, mode=Mode.SUBTRACT)

    # Sketch12 → Boss-Extrude6 (add)
    with BuildSketch(Plane(origin=(0, 143.35, 0), x_dir=(1, 0, 0), z_dir=(0, 1, 0))):
        with Locations((49.583522107, -89.31)):
            Rectangle(SKETCH12_W, SKETCH12_H)
    extrude(amount=-BOSS_EXTRUDE6_DEPTH)

    # Sketch14 → Boss-Extrude7 (add)
    with BuildSketch(Plane(origin=(0, 143.35, 0), x_dir=(1, 0, 0), z_dir=(0, 1, 0))):
        with Locations((-22.9, -89.31)):
            Rectangle(SKETCH14_W, SKETCH14_H)
    extrude(amount=-BOSS_EXTRUDE7_DEPTH)

    # Sketch15 → Cut-Extrude11 (cut)
    with BuildSketch(Plane.XY.offset(116.81)):
        with Locations((-22.9, 76.675)):
            Rectangle(SKETCH15_W, SKETCH15_H)
    extrude(amount=-CUT_EXTRUDE11_DEPTH, mode=Mode.SUBTRACT)

    # Sketch16 → Boss-Extrude9 (add)
    # profile 1 of 5: a face of its own
    with BuildSketch(Plane.XY.offset(116.81)):
        with Locations((-102.883522107, 76.675)):
            Rectangle(SKETCH16_W, SKETCH16_H)
    # profile 2 of 5: a face of its own
    with BuildSketch(Plane.XY.offset(116.81)):
        with Locations((-22.9, 76.675)):
            Rectangle(SKETCH16_W_2, SKETCH16_H)
        Polygon((-92.883522107, 127.475), (-92.883522107, 138.35), (47.083522107, 138.35), (47.083522107, 127.475), (47.083522107, 76.675), (47.083522107, 25.875), (47.083522107, 15), (-92.883522107, 15), (-92.883522107, 25.875), (-92.883522107, 76.675), align=None, mode=Mode.SUBTRACT)
    # profile 3 of 5: a face of its own
    with BuildSketch(Plane.XY.offset(116.81)):
        with Locations((57.083522107, 76.675)):
            Rectangle(SKETCH16_W, SKETCH16_H)
    # profile 4 of 5: a face of its own
    with BuildSketch(Plane.XY.offset(116.81)):
        Polygon((47.083522107, 138.35), (-92.883522107, 138.35), (-92.883522107, 127.475), (-22.9, 127.475), (47.083522107, 127.475), align=None)
    # profile 5 of 5: a face of its own
    with BuildSketch(Plane.XY.offset(116.81)):
        Polygon((-22.9, 25.875), (-92.883522107, 25.875), (-92.883522107, 15), (47.083522107, 15), (47.083522107, 25.875), align=None)
    extrude(amount=-BOSS_EXTRUDE9_DEPTH)

    # Sketch17 → Cut-Extrude12 (cut)
    with BuildSketch(Plane.XY.offset(116.81)):
        with Locations((-22.9, 76.675)):
            Rectangle(SKETCH17_W, SKETCH17_H)
        with Locations((-22.9, 76.675)):
            Rectangle(SKETCH17_W_2, SKETCH17_H_2, mode=Mode.SUBTRACT)
    extrude(amount=-CUT_EXTRUDE12_DEPTH, mode=Mode.SUBTRACT)

    # Chamfer2: one chamfer whose edges measure the first distance from different faces: ONE call of the kernel's chamfer builder (chamfer() names one face for all edges)
    chamfer2_edges_1 = [part.edges().sort_by_distance(p)[0] for p in [
        (-22.9, 25.875, 99.81),
    ]]
    chamfer2_side_1 = [part.faces().sort_by_distance(p)[0] for p in [
        (-22.9, 25.875, 108.31),
    ]]
    chamfer2_edges_2 = [part.edges().sort_by_distance(p)[0] for p in [
        (-22.9, 127.475, 99.81),
    ]]
    chamfer2_side_2 = [part.faces().sort_by_distance(p)[0] for p in [
        (-22.9, 132.9125, 99.81),
    ]]
    chamfer2 = BRepFilletAPI_MakeChamfer(part.part.solid().wrapped)
    for e in chamfer2_edges_1:
        chamfer2.Add(CHAMFER2_SIZE, CHAMFER2_SIZE2, e.wrapped, chamfer2_side_1[0].wrapped)  # the first distance lies on this face
    for e in chamfer2_edges_2:
        chamfer2.Add(CHAMFER2_SIZE, CHAMFER2_SIZE2, e.wrapped, chamfer2_side_2[0].wrapped)  # the first distance lies on this face
    add(Compound.cast(chamfer2.Shape()), mode=Mode.REPLACE)

    # Sketch20 → Cut-Extrude17 (cut)
    with BuildSketch(Plane.XY.offset(116.81)):
        with Locations((-22.9, 11.675)):
            Rectangle(SKETCH20_W, SKETCH20_H)
    extrude(amount=-CUT_EXTRUDE17_DEPTH, mode=Mode.SUBTRACT)

    # Sketch25 → Boss-Extrude11 (add)
    with BuildSketch(Plane(origin=(0, 13.35, 0), x_dir=(-1, 0, 0), z_dir=(0, -1, 0))):
        with Locations((22.9, -86.196751346)):
            Rectangle(SKETCH25_W, SKETCH25_H)
    extrude(amount=-BOSS_EXTRUDE11_DEPTH)

    # Sketch26 → Boss-Extrude12 (add)
    with BuildSketch(Plane.XY.offset(116.81)):
        with Locations((-109.383522107, 78.35)):
            Rectangle(SKETCH26_W, SKETCH26_H)
        with Locations((63.583522107, 78.35)):
            Rectangle(SKETCH26_W, SKETCH26_H)
    extrude(amount=-BOSS_EXTRUDE12_DEPTH)

    # Sketch18 → Cut-Extrude19 (cut)
    with BuildSketch(Plane.XY.offset(116.81)):
        with Locations((-105.383522107, 22)):
            Circle(SKETCH18_R)
        with Locations((59.583522107, 22)):
            Circle(SKETCH18_R)
        with Locations((59.583522107, 131.35)):
            Circle(SKETCH18_R)
        with Locations((-105.383522107, 131.35)):
            Circle(SKETCH18_R)
    extrude(amount=-CUT_EXTRUDE19_DEPTH, mode=Mode.SUBTRACT)

    # Sketch27 → Cut-Extrude20 (cut)
    with BuildSketch(Plane.XY.offset(66.81)):
        with Locations((7.083522107, 136.85)):
            Rectangle(SKETCH27_W, SKETCH27_H)
    extrude(amount=-CUT_EXTRUDE20_DEPTH, mode=Mode.SUBTRACT)

    # Sketch28 → Cut-Extrude21 (cut)
    with BuildSketch(Plane(origin=(0, 18.35, 0), x_dir=(1, 0, 0), z_dir=(0, 1, 0))):
        with Locations(Location((-77.883522107, -82.81, 0), (0, 0, 270))):
            Circle(SKETCH28_R)
        with Locations(Location((-57.883522107, -82.81, 0), (0, 0, 270))):
            Circle(SKETCH28_R)
        with Locations(Location((-37.883522107, -82.81, 0), (0, 0, 270))):
            Circle(SKETCH28_R)
        with Locations(Location((-17.883522107, -82.81, 0), (0, 0, 270))):
            Circle(SKETCH28_R)
        with Locations(Location((2.116477893, -82.81, 0), (0, 0, 270))):
            Circle(SKETCH28_R)
        with Locations(Location((22.116477893, -82.81, 0), (0, 0, 270))):
            Circle(SKETCH28_R)
    extrude(amount=-CUT_EXTRUDE21_DEPTH, mode=Mode.SUBTRACT)

    # Sketch29 → Boss-Extrude13 (add)
    with BuildSketch(Plane(origin=(0, 0, 61.81), x_dir=(-1, 0, 0), z_dir=(0, 0, -1))):
        with Locations((47.190948631, 83.35)):
            Rectangle(SKETCH29_W, SKETCH29_H)
    extrude(amount=BOSS_EXTRUDE13_DEPTH)

    # Sketch30 → Cut-Extrude22 (cut)
    with BuildSketch(Plane.ZY.offset(54.690948631)):
        with Locations((59.81, 83.35)):
            Rectangle(SKETCH30_W, SKETCH30_H)
    extrude(amount=-CUT_EXTRUDE22_DEPTH, mode=Mode.SUBTRACT)

    # Chamfer3
    chamfer3_edges = [part.edges().sort_by_distance(p)[0] for p in [
        (-47.190948631, 68.35, 61.81),
        (-47.190948631, 98.35, 61.81),
    ]]
    chamfer(chamfer3_edges, length=CHAMFER3_SIZE)

    # Sketch31 → Cut-Extrude23 (cut)
    with BuildSketch(Plane.XY.offset(116.81)):
        with Locations((-22.9, 1.346590829)):
            Rectangle(SKETCH31_W, SKETCH31_H)
        with Locations((-22.9, 152.003409172)):
            Rectangle(SKETCH31_W, SKETCH31_H)
    extrude(amount=-CUT_EXTRUDE23_DEPTH, mode=Mode.SUBTRACT)

    # Sketch33 → Cut-Extrude25 (cut)
    with BuildSketch(Plane.ZY.offset(97.883522107)):
        with Locations((82.81, 67.475)):
            Rectangle(SKETCH33_W, SKETCH33_H)
    extrude(amount=-CUT_EXTRUDE25_DEPTH, mode=Mode.SUBTRACT)

    # Chamfer5
    chamfer5_edges = [part.edges().sort_by_distance(p)[0] for p in [
        (-39.690948631, 83.35, 51.81),
        (-54.690948631, 83.35, 51.81),
    ]]
    chamfer(chamfer5_edges, length=CHAMFER5_SIZE)

    # Chamfer6
    chamfer6_edges = [part.edges().sort_by_distance(p)[0] for p in [
        (-47.190948631, 98.35, 51.81),
        (-47.190948631, 68.35, 51.81),
    ]]
    chamfer(chamfer6_edges, length=CHAMFER6_SIZE - 0.0001)  # a hair under: the kernel refuses the full size

    # Fillet2
    # the kernel refuses this fillet: 10 mm, written as the material it takes off along each edge
    with BuildSketch(Plane(origin=(-49.690948631, 104.705439059, 51.81), x_dir=(-0.7071067811865475, 0, 0.7071067811865475), z_dir=(0, -1, 0))) as fillet2_piece_1:
        with BuildLine():
            CenterArc((FILLET2_R * 0.414213562373, -FILLET2_R), FILLET2_R, 90, 45)
            Line((-FILLET2_R * 0.292893218813, -FILLET2_R * 0.292893218813), (0, 0))
            Line((0, 0), (FILLET2_R * 0.414213562373, 0))
        make_face()
    extrude(amount=42.710878119, mode=Mode.SUBTRACT)
    with BuildSketch(Plane(origin=(-44.690948631, 61.994560941, 51.81), x_dir=(-1, 0, 0), z_dir=(0, 1, 0))) as fillet2_piece_2:
        with BuildLine():
            CenterArc((FILLET2_R * 0.414213562373, FILLET2_R), FILLET2_R, 225, 45)
            Line((-FILLET2_R * 0.292893218813, FILLET2_R * 0.292893218813), (0, 0))
            Line((0, 0), (FILLET2_R * 0.414213562373, 0))
        make_face()
    extrude(amount=42.710878119, mode=Mode.SUBTRACT)

    # Sketch32 → Cut-Extrude26 (cut)
    with BuildSketch(Plane.XY.offset(66.81)):
        with Locations((-60.006477893, 103.09)):
            Circle(SKETCH32_R)
        with Locations((5.083522107, 30.7)):
            Circle(SKETCH32_R)
    extrude(amount=-CUT_EXTRUDE26_DEPTH, mode=Mode.SUBTRACT)

    # Chamfer7
    chamfer7_edges = [part.edges().sort_by_distance(p)[0] for p in [
        (-39.690948631, 99.6, 61.81),
        (-54.690948631, 67.1, 61.81),
        (-39.690948631, 67.1, 61.81),
    ]]
    chamfer7_side = [part.faces().sort_by_distance(p)[0] for p in [
        (-22.812662078, 75.997492885, 61.81),
    ]]
    chamfer(chamfer7_edges, length=CHAMFER7_SIZE, length2=CHAMFER7_SIZE2, reference=chamfer7_side[0])

    # Sketch34 → Boss-Extrude14 (add)
    with BuildSketch(Plane.ZY.offset(-47.083522107)):
        with Locations((73.07, 21.525)):
            Rectangle(SKETCH34_W, SKETCH34_H)
    extrude(amount=BOSS_EXTRUDE14_DEPTH)

    # Fillet3
    fillet3_edges = [part.edges().sort_by_distance(p)[0] for p in [
        (18.503522107, 24.7, 73.07),
    ]]
    fillet(fillet3_edges, radius=FILLET3_R)

    # Fillet4
    # the kernel refuses this fillet: 53 mm, written as the material it takes off along each edge
    with BuildSketch(Plane(origin=(47.083522107, 20.101497308, 99.81), x_dir=(0, 0.5000000000000011, 0.866025403784438), z_dir=(-1, 0, 0))) as fillet4_piece_1:
        with BuildLine():
            CenterArc((11.713308348, -53), FILLET4_R, 90, 13.740767961)
            Line((-0.875748654, -1.516841163), (0, 0))
            Line((0, 0), (11.713308348, 0))
        make_face()
    extrude(amount=139.967044213, mode=Mode.SUBTRACT)

    # Fillet5
    # the kernel refuses this fillet: 163 mm, written as the material it takes off along each edge
    with BuildSketch(Plane(origin=(-92.883522107, 137.475, 99.81), x_dir=(0, 1, 0), z_dir=(1, 0, 0))) as fillet5_piece_1:
        with BuildLine():
            CenterArc((71.820622524, 146.750532008), FILLET5_R, 240, 4.198846939)
            Line((-9.679377476, 5.588391191), (0, 0))
            Line((0, 0), (0.875, 0))
        make_face()
    extrude(amount=139.967044213, mode=Mode.SUBTRACT)

    # Chamfer8
    chamfer8_edges = [part.edges().sort_by_distance(p)[0] for p in [
        (7.083522107, 135.35, 66.81),
    ]]
    chamfer8_side = [part.faces().sort_by_distance(p)[0] for p in [
        (-23.219737969, 77.729226507, 66.81),
    ]]
    chamfer(chamfer8_edges, length=CHAMFER8_SIZE, length2=CHAMFER8_SIZE2, reference=chamfer8_side[0])

    # Fillet7
    # the kernel refuses this fillet: 10 mm, written as the material it takes off along each edge
    with BuildSketch(Plane(origin=(37.083522107, 135.35, 63.953703987), x_dir=(0, 0, -1), z_dir=(-1, 0, 0))) as fillet7_piece_1:
        with BuildLine():
            CenterArc((3.238895476, 9.93984686), FILLET7_R, 235, 28.712402638)
            Line((-2.496868888, 1.748326417), (-2.611584175, 1.584496008))
            Line((-2.611584175, 1.584496008), (-0.114715287, -0.163830409))
            Line((-0.114715287, -0.163830409), (0, -0.2))
            ThreePointArc((0, -0.2), (1.071851993, -0.2), (2.121800157, -0.198796937))
            Line((2.121800157, -0.198796937), (2.143703987, 0))
        make_face()
    extrude(amount=60, mode=Mode.SUBTRACT)


solid = part.part
